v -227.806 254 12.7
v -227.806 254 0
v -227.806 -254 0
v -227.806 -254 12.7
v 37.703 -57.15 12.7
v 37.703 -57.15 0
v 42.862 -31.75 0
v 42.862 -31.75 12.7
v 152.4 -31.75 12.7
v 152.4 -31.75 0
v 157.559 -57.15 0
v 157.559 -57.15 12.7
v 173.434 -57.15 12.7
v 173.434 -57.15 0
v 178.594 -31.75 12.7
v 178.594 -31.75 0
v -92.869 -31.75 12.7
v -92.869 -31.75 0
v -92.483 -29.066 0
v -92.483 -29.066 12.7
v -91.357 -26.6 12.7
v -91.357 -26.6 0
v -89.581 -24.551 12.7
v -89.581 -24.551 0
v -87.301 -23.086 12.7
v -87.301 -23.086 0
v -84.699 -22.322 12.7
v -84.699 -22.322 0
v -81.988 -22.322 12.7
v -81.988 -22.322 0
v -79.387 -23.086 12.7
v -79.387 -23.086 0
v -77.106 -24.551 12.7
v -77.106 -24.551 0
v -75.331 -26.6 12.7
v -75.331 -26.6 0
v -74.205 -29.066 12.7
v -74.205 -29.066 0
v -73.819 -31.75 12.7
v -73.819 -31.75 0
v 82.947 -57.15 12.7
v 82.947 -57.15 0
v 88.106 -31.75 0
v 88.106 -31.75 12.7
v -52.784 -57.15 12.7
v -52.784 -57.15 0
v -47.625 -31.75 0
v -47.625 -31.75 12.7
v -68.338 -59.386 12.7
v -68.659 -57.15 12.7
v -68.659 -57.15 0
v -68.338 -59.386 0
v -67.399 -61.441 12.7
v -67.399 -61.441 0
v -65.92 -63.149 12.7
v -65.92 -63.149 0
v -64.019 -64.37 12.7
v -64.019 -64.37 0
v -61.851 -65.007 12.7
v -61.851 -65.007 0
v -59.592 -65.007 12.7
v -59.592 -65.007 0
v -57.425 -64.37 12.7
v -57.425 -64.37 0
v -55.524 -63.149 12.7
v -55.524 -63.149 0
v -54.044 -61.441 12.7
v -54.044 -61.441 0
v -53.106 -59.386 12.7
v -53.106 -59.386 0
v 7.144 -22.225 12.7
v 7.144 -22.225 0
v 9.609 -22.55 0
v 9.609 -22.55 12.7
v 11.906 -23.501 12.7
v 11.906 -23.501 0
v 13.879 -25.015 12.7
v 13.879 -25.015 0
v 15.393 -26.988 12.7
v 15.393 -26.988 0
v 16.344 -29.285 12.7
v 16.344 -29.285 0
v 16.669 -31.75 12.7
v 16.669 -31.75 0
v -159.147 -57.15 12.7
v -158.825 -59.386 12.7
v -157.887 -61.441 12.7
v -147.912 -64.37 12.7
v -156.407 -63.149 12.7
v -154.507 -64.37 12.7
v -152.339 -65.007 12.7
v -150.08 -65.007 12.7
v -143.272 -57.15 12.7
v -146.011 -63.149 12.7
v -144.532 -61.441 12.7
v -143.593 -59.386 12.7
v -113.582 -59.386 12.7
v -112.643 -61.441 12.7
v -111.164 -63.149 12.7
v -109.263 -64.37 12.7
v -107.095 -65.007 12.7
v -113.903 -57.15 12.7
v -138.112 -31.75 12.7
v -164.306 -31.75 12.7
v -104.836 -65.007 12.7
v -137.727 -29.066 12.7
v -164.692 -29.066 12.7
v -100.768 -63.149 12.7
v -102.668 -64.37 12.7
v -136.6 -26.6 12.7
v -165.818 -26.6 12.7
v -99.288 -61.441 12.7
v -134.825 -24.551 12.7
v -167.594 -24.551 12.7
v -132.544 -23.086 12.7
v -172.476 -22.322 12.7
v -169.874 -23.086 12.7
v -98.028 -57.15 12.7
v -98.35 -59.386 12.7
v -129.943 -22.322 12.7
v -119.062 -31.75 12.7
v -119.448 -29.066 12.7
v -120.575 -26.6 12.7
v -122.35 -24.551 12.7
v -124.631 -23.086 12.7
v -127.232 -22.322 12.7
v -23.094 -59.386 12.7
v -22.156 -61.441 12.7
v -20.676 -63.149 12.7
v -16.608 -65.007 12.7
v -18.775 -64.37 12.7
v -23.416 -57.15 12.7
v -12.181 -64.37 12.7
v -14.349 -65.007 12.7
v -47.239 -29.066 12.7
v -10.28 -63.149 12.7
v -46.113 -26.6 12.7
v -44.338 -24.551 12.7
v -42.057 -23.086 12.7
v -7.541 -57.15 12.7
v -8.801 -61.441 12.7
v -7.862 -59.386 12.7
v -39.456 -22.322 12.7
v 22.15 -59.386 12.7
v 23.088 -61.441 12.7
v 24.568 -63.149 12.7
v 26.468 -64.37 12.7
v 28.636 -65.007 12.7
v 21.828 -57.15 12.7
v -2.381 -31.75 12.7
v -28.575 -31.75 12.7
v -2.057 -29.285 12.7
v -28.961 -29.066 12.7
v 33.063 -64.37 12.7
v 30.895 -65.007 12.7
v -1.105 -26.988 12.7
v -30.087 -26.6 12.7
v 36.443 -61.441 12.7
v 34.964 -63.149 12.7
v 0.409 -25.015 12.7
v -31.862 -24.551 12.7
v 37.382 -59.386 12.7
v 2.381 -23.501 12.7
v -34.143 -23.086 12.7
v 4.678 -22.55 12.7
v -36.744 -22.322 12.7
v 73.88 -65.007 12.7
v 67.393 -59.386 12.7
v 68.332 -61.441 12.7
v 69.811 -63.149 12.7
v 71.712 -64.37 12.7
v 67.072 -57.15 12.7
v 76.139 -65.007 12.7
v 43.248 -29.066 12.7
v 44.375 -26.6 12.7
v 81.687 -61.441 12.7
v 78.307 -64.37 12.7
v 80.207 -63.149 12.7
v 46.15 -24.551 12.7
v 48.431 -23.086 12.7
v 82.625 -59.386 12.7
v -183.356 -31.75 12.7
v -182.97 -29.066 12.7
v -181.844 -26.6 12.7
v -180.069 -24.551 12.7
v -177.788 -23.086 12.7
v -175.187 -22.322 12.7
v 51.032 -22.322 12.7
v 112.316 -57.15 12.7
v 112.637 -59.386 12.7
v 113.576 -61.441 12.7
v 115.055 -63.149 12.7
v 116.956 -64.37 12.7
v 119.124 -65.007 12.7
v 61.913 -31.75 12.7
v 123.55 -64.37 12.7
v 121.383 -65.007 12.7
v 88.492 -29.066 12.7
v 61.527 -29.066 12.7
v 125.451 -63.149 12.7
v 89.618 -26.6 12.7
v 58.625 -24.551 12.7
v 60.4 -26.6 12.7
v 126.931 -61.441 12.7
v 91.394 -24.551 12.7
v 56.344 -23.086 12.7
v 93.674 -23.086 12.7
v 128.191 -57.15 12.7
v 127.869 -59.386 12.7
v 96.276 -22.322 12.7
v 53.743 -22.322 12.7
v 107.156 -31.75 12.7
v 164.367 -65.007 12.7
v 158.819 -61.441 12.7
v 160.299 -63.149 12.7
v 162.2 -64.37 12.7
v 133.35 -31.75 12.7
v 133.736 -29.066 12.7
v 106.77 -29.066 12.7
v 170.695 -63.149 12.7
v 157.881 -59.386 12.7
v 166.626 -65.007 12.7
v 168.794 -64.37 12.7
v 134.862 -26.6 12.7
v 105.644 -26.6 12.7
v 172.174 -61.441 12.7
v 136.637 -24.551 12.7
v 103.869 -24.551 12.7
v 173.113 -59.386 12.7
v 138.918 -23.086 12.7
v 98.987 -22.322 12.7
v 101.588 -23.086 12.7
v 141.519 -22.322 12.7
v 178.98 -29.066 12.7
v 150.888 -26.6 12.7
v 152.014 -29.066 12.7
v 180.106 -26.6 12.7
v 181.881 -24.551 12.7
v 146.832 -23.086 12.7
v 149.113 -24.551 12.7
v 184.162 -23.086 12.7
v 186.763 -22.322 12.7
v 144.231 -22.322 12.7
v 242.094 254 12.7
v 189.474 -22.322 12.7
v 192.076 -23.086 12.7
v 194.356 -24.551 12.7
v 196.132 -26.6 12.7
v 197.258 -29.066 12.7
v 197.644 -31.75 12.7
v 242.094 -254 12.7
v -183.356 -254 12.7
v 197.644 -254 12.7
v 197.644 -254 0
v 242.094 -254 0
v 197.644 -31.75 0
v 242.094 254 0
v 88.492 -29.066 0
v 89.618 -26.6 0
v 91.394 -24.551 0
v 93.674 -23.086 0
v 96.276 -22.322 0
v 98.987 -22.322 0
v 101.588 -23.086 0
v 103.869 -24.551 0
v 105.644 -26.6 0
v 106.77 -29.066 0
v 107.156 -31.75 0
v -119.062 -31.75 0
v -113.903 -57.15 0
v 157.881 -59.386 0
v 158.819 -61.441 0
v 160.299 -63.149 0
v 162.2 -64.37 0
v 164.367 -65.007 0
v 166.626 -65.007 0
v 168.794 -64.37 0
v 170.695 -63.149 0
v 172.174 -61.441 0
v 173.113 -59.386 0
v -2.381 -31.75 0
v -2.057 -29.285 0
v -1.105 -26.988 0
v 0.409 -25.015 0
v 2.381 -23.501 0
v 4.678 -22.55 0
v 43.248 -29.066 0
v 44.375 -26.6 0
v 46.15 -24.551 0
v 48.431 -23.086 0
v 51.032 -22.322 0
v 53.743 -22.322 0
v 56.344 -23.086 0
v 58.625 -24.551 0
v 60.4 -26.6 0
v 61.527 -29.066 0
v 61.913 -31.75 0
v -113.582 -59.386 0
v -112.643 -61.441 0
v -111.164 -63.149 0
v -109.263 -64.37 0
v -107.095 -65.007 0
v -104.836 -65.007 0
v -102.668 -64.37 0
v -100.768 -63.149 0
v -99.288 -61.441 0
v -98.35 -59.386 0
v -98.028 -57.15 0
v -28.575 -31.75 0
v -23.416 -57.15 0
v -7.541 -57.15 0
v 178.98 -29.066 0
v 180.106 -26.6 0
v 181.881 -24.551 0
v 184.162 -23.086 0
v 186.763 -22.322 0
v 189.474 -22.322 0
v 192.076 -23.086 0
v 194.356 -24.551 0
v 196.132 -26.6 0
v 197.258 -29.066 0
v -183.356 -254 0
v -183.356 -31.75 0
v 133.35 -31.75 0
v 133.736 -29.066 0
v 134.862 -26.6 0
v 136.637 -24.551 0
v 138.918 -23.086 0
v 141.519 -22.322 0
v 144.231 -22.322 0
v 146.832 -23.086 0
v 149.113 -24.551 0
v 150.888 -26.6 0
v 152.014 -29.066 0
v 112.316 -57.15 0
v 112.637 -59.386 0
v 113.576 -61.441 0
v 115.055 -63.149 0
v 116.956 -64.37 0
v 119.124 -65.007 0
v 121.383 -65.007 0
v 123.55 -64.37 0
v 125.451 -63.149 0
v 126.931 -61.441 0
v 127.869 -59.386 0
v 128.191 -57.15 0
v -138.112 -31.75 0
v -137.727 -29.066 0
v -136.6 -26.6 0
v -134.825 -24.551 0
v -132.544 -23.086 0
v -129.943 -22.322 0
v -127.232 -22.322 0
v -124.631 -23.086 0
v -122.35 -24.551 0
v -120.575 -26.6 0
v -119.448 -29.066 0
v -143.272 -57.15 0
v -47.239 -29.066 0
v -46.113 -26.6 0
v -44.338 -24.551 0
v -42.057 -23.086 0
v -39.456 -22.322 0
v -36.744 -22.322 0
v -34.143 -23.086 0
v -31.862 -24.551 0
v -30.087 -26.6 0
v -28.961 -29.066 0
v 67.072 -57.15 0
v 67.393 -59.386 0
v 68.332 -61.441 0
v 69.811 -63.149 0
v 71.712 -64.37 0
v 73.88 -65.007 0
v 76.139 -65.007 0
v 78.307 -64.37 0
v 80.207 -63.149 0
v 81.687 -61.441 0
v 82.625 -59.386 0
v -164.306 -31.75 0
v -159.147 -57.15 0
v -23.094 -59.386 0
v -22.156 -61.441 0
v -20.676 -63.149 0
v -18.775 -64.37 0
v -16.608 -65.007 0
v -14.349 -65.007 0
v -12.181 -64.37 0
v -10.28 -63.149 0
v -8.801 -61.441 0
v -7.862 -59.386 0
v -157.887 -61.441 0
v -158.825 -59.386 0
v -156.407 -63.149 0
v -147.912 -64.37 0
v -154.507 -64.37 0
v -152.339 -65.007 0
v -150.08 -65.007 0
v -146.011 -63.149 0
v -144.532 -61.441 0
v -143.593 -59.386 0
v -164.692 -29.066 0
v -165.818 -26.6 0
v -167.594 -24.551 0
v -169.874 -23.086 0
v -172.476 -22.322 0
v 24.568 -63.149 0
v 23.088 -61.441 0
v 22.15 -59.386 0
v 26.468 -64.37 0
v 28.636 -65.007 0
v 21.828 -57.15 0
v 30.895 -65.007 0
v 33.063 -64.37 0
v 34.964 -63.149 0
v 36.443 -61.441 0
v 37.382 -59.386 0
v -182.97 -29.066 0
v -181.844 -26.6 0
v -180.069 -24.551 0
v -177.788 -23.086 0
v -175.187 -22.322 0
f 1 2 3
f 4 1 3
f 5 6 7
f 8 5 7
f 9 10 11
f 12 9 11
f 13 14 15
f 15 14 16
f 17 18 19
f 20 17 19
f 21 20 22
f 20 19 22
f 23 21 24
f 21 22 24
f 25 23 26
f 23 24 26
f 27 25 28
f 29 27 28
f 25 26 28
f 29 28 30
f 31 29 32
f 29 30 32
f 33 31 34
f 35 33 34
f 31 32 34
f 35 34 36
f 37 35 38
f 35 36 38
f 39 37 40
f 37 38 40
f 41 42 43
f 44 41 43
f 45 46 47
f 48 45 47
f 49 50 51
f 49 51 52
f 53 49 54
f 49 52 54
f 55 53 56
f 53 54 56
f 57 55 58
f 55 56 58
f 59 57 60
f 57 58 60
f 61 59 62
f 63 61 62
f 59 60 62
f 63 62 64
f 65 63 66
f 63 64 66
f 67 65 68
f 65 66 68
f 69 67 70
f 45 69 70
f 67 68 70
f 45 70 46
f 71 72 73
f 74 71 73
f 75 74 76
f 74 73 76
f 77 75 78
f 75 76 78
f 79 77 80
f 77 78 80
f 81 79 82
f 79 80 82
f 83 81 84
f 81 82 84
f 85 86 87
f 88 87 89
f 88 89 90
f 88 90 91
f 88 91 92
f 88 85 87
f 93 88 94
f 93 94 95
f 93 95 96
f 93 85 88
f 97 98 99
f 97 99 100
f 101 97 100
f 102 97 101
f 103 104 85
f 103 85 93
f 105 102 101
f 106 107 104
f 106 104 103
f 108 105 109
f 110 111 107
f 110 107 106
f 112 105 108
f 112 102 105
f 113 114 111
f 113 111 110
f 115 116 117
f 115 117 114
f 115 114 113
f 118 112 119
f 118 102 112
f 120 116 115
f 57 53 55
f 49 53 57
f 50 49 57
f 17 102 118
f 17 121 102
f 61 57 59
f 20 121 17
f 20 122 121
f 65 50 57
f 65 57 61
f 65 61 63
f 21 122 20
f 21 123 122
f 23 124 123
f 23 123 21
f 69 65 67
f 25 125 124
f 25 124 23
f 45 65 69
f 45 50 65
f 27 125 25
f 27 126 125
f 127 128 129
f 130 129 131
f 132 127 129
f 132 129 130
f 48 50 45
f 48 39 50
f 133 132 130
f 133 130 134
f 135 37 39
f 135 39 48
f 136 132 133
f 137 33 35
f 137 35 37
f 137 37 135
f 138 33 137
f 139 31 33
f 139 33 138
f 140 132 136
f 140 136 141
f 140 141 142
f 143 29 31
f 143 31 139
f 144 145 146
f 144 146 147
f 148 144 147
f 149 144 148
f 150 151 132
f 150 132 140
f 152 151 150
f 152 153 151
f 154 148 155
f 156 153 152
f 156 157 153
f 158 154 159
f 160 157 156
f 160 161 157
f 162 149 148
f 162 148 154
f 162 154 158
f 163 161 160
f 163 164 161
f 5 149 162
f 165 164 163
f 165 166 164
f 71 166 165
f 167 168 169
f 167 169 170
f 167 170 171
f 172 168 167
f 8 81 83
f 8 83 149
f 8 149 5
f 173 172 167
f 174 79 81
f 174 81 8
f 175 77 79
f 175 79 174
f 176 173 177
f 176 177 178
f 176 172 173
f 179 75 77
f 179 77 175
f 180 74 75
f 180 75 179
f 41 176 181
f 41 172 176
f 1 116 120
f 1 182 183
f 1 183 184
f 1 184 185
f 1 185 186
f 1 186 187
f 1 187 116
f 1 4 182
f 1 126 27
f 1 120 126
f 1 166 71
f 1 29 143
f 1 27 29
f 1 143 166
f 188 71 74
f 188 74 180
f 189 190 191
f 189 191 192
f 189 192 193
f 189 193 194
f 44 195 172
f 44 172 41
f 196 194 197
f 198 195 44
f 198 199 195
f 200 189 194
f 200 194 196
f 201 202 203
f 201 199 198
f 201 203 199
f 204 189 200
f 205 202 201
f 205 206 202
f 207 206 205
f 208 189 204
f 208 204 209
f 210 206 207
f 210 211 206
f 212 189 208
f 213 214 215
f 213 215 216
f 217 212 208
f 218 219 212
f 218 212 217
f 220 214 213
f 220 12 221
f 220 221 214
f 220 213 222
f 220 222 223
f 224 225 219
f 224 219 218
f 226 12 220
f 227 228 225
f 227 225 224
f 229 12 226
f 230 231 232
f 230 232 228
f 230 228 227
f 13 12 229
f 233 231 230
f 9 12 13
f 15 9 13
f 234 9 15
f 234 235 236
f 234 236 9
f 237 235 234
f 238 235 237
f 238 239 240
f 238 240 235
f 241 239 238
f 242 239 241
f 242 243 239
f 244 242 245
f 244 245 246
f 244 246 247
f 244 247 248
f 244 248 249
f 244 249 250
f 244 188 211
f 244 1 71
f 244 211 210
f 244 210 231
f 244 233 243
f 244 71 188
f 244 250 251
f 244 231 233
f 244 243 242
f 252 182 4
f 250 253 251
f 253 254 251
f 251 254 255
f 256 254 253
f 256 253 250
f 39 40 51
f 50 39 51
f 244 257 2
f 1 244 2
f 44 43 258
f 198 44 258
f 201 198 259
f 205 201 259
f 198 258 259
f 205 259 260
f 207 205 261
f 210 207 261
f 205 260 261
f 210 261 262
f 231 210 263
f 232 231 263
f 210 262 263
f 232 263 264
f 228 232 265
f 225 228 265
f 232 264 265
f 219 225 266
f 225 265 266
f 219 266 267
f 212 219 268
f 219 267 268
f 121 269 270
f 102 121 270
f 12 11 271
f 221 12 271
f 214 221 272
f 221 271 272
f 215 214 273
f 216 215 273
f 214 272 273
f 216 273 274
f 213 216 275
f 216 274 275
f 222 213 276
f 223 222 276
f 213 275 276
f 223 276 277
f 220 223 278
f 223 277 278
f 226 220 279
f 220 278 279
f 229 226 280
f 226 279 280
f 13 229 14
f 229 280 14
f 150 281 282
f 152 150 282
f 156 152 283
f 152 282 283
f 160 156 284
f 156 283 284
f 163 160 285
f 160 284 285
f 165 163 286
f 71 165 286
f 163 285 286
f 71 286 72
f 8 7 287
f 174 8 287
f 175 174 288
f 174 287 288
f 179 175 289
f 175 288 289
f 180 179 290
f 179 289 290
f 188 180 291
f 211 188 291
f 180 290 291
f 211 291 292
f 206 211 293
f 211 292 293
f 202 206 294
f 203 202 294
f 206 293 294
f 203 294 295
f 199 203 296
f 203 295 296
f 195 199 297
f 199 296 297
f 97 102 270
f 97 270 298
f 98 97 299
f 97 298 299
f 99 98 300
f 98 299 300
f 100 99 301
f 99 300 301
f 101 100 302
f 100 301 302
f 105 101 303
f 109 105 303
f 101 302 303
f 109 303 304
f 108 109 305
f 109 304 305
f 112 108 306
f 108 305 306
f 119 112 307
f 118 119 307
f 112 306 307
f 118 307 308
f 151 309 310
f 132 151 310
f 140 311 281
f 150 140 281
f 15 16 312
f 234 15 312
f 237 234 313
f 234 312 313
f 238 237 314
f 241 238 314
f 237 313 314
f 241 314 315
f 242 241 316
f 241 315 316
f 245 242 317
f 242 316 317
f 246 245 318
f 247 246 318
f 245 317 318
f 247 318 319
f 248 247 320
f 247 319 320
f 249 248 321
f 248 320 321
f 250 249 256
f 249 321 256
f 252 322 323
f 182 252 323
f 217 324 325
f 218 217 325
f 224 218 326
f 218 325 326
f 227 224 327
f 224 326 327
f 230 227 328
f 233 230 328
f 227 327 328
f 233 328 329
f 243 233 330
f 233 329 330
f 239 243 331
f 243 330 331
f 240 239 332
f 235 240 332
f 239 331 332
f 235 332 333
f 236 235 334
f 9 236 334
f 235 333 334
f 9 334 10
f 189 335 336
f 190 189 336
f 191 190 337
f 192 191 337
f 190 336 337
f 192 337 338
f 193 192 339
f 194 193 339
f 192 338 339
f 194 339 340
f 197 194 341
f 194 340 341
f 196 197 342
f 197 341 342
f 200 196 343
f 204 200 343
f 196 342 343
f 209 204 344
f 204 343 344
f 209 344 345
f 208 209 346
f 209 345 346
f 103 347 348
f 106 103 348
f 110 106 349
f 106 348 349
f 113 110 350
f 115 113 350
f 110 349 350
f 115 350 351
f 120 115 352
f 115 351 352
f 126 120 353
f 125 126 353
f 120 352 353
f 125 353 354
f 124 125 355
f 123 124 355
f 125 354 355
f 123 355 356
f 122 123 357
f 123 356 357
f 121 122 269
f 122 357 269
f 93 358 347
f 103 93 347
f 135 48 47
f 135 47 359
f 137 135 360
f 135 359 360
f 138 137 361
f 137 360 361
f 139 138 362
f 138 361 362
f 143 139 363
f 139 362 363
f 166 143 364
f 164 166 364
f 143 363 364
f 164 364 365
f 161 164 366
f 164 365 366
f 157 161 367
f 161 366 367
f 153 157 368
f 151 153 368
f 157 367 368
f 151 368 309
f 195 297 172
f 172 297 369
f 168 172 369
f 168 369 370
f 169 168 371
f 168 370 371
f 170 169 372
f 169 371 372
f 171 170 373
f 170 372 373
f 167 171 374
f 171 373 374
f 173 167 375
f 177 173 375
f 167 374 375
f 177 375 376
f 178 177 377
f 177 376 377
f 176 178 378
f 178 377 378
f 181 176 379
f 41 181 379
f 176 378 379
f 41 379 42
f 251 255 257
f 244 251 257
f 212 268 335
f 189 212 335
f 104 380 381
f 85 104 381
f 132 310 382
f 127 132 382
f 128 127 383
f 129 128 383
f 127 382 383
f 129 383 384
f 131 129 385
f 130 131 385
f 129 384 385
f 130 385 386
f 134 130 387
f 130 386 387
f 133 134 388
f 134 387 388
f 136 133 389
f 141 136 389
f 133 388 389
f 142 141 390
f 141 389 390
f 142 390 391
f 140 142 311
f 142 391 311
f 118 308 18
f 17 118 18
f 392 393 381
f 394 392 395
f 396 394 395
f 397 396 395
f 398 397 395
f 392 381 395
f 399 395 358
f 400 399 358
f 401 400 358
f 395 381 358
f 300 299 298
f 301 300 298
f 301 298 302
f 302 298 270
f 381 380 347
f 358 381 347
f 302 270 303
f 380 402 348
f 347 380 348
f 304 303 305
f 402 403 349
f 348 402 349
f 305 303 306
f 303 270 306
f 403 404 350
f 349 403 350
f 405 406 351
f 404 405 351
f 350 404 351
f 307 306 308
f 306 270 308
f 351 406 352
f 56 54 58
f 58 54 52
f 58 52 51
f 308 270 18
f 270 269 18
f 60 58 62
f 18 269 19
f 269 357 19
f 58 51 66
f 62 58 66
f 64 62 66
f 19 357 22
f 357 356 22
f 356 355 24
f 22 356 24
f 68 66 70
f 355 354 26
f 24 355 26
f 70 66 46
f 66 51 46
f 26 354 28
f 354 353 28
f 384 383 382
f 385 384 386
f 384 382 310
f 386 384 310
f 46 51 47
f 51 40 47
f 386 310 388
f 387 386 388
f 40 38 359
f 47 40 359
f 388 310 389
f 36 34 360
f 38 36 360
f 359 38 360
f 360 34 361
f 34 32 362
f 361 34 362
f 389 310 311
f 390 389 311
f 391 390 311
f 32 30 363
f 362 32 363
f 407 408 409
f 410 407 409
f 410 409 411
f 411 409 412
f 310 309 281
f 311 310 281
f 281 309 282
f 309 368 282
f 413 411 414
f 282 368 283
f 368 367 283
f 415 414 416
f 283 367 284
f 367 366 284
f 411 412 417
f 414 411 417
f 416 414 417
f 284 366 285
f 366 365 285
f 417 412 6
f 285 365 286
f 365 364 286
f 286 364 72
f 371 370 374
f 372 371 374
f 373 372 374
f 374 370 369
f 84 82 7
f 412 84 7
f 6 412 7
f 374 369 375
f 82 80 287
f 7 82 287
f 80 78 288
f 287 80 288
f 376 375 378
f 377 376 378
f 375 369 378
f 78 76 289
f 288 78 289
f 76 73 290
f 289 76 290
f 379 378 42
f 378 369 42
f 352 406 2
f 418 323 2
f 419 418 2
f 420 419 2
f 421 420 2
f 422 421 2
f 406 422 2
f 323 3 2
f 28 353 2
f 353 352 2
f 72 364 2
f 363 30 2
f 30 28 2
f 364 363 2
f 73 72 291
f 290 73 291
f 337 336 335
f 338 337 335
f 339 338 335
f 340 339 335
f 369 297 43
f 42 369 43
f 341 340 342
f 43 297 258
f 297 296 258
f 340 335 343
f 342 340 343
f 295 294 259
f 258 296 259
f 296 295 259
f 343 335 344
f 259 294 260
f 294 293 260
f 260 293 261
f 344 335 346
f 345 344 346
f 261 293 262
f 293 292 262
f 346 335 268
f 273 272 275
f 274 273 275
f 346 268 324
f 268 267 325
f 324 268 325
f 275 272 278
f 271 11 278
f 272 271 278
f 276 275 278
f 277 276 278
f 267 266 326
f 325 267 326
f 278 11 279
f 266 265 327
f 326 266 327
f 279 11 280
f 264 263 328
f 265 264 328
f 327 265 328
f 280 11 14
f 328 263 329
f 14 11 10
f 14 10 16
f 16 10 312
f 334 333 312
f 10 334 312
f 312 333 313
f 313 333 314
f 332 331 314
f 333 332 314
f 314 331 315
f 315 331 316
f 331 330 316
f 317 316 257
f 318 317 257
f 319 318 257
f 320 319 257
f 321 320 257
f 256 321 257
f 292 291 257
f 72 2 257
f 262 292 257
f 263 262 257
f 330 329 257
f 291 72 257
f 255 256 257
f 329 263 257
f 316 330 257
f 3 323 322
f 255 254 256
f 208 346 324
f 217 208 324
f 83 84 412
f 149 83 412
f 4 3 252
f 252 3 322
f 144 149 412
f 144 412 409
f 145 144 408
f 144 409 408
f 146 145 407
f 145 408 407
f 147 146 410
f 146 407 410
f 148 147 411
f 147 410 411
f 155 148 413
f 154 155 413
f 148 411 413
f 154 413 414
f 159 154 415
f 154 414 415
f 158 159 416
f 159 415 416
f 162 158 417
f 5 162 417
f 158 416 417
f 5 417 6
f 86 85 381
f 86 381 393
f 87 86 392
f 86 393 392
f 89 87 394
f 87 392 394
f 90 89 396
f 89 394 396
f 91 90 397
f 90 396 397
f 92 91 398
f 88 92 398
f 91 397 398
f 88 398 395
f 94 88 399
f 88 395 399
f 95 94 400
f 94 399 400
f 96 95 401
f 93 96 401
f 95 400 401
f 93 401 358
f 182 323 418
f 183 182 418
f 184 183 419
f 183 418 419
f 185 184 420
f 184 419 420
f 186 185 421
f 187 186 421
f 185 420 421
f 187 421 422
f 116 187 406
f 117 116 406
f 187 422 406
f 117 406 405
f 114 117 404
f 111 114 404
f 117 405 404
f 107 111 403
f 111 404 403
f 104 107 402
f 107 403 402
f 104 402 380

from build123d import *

# Parameters (mm, degrees)
F0_W     = 44.45
F0_H     = 222.25
F1_DEPTH = 12.7


with BuildPart() as f1:
    # F0 (on Top) → F1 (new body)
    with BuildSketch(Plane.XY):
        with BuildLine():
            Line((-227.80625, 254), (-227.80625, -31.75))
            Line((-227.80625, -31.75), (-183.35625, -31.75))
            ThreePointArc((-183.35625, -31.75), (-173.83125, -22.225), (-164.30625, -31.75))
            Line((-164.30625, -31.75), (-138.1125, -31.75))
            ThreePointArc((-138.1125, -31.75), (-128.5875, -22.225), (-119.0625, -31.75))
            Line((-119.0625, -31.75), (-92.86875, -31.75))
            ThreePointArc((-92.86875, -31.75), (-83.34375, -22.225), (-73.81875, -31.75))
            Line((-73.81875, -31.75), (-47.625, -31.75))
            ThreePointArc((-47.625, -31.75), (-38.1, -22.225), (-28.575, -31.75))
            Line((-28.575, -31.75), (-2.38125, -31.75))
            ThreePointArc((-2.38125, -31.75), (0.408558, -25.014808), (7.14375, -22.225))
            Line((7.14375, -22.225), (7.14375, 254))
            Line((7.14375, 254), (-227.80625, 254))
        make_face()
        with Locations((-205.58125, -142.875)):
            Rectangle(F0_W, F0_H)
        with Locations((219.86875, -142.875)):
            Rectangle(F0_W, F0_H)
        with BuildLine():
            ThreePointArc((178.59375, -31.75), (188.11875, -22.225), (197.64375, -31.75))
            Line((197.64375, -31.75), (242.09375, -31.75))
            Line((242.09375, -31.75), (242.09375, 254))
            Line((242.09375, 254), (7.14375, 254))
            Line((7.14375, 254), (7.14375, -22.225))
            ThreePointArc((7.14375, -22.225), (13.878942, -25.014808), (16.66875, -31.75))
            Line((16.66875, -31.75), (42.8625, -31.75))
            ThreePointArc((42.8625, -31.75), (52.3875, -22.225), (61.9125, -31.75))
            Line((61.9125, -31.75), (88.10625, -31.75))
            ThreePointArc((88.10625, -31.75), (97.63125, -22.225), (107.15625, -31.75))
            Line((107.15625, -31.75), (133.35, -31.75))
            ThreePointArc((133.35, -31.75), (142.875, -22.225), (152.4, -31.75))
            Line((152.4, -31.75), (165.496875, -31.75))
            Line((165.496875, -31.75), (178.59375, -31.75))
        make_face()
        with BuildLine():
            Line((173.434375, -57.15), (178.59375, -31.75))
            Line((178.59375, -31.75), (165.496875, -31.75))
            Line((165.496875, -31.75), (165.496875, -49.2125))
            ThreePointArc((165.496875, -49.2125), (171.109535, -51.53734), (173.434375, -57.15))
        make_face()
        with BuildLine():
            Line((165.496875, -49.2125), (165.496875, -31.75))
            Line((165.496875, -31.75), (152.4, -31.75))
            Line((152.4, -31.75), (157.559375, -57.15))
            ThreePointArc((157.559375, -57.15), (159.884215, -51.53734), (165.496875, -49.2125))
        make_face()
        with BuildLine():
            ThreePointArc((157.559375, -57.15), (165.496875, -65.0875), (173.434375, -57.15))
            ThreePointArc((173.434375, -57.15), (171.109535, -51.53734), (165.496875, -49.2125))
            ThreePointArc((165.496875, -49.2125), (159.884215, -51.53734), (157.559375, -57.15))
        make_face()
        with BuildLine():
            Line((128.190625, -57.15), (133.35, -31.75))
            Line((133.35, -31.75), (107.15625, -31.75))
            Line((107.15625, -31.75), (112.315625, -57.15))
            ThreePointArc((112.315625, -57.15), (120.253125, -49.2125), (128.190625, -57.15))
        make_face()
        with BuildLine():
            ThreePointArc((112.315625, -57.15), (120.253125, -65.0875), (128.190625, -57.15))
            ThreePointArc((128.190625, -57.15), (120.253125, -49.2125), (112.315625, -57.15))
        make_face()
        with BuildLine():
            Line((88.10625, -31.75), (61.9125, -31.75))
            Line((61.9125, -31.75), (67.071875, -57.15))
            ThreePointArc((67.071875, -57.15), (75.009375, -49.2125), (82.946875, -57.15))
            Line((82.946875, -57.15), (88.10625, -31.75))
        make_face()
        with BuildLine():
            ThreePointArc((82.946875, -57.15), (75.009375, -49.2125), (67.071875, -57.15))
            ThreePointArc((67.071875, -57.15), (75.009375, -65.0875), (82.946875, -57.15))
        make_face()
        with BuildLine():
            Line((42.8625, -31.75), (16.66875, -31.75))
            Line((16.66875, -31.75), (21.828125, -57.15))
            ThreePointArc((21.828125, -57.15), (29.765625, -49.2125), (37.703125, -57.15))
            Line((37.703125, -57.15), (42.8625, -31.75))
        make_face()
        with BuildLine():
            ThreePointArc((37.703125, -57.15), (29.765625, -49.2125), (21.828125, -57.15))
            ThreePointArc((21.828125, -57.15), (29.765625, -65.0875), (37.703125, -57.15))
        make_face()
        with BuildLine():
            Line((-7.540625, -57.15), (-2.38125, -31.75))
            Line((-2.38125, -31.75), (-28.575, -31.75))
            Line((-28.575, -31.75), (-23.415625, -57.15))
            ThreePointArc((-23.415625, -57.15), (-15.478125, -49.2125), (-7.540625, -57.15))
        make_face()
        with BuildLine():
            ThreePointArc((-23.415625, -57.15), (-15.478125, -65.0875), (-7.540625, -57.15))
            ThreePointArc((-7.540625, -57.15), (-15.478125, -49.2125), (-23.415625, -57.15))
        make_face()
        with BuildLine():
            Line((-47.625, -31.75), (-73.81875, -31.75))
            Line((-73.81875, -31.75), (-68.659375, -57.15))
            ThreePointArc((-68.659375, -57.15), (-60.721875, -49.2125), (-52.784375, -57.15))
            Line((-52.784375, -57.15), (-47.625, -31.75))
        make_face()
        with BuildLine():
            ThreePointArc((-52.784375, -57.15), (-60.721875, -49.2125), (-68.659375, -57.15))
            ThreePointArc((-68.659375, -57.15), (-60.721875, -65.0875), (-52.784375, -57.15))
        make_face()
        with BuildLine():
            Line((-92.86875, -31.75), (-119.0625, -31.75))
            Line((-119.0625, -31.75), (-113.903125, -57.15))
            ThreePointArc((-113.903125, -57.15), (-105.965625, -49.2125), (-98.028125, -57.15))
            Line((-98.028125, -57.15), (-92.86875, -31.75))
        make_face()
        with BuildLine():
            ThreePointArc((-98.028125, -57.15), (-105.965625, -49.2125), (-113.903125, -57.15))
            ThreePointArc((-113.903125, -57.15), (-105.965625, -65.0875), (-98.028125, -57.15))
        make_face()
        with BuildLine():
            Line((-138.1125, -31.75), (-164.30625, -31.75))
            Line((-164.30625, -31.75), (-159.146875, -57.15))
            ThreePointArc((-159.146875, -57.15), (-151.209375, -49.2125), (-143.271875, -57.15))
            Line((-143.271875, -57.15), (-138.1125, -31.75))
        make_face()
        with BuildLine():
            ThreePointArc((-143.271875, -57.15), (-151.209375, -49.2125), (-159.146875, -57.15))
            ThreePointArc((-159.146875, -57.15), (-151.209375, -65.0875), (-143.271875, -57.15))
        make_face()
    extrude(amount=F1_DEPTH)


solid = f1.part
